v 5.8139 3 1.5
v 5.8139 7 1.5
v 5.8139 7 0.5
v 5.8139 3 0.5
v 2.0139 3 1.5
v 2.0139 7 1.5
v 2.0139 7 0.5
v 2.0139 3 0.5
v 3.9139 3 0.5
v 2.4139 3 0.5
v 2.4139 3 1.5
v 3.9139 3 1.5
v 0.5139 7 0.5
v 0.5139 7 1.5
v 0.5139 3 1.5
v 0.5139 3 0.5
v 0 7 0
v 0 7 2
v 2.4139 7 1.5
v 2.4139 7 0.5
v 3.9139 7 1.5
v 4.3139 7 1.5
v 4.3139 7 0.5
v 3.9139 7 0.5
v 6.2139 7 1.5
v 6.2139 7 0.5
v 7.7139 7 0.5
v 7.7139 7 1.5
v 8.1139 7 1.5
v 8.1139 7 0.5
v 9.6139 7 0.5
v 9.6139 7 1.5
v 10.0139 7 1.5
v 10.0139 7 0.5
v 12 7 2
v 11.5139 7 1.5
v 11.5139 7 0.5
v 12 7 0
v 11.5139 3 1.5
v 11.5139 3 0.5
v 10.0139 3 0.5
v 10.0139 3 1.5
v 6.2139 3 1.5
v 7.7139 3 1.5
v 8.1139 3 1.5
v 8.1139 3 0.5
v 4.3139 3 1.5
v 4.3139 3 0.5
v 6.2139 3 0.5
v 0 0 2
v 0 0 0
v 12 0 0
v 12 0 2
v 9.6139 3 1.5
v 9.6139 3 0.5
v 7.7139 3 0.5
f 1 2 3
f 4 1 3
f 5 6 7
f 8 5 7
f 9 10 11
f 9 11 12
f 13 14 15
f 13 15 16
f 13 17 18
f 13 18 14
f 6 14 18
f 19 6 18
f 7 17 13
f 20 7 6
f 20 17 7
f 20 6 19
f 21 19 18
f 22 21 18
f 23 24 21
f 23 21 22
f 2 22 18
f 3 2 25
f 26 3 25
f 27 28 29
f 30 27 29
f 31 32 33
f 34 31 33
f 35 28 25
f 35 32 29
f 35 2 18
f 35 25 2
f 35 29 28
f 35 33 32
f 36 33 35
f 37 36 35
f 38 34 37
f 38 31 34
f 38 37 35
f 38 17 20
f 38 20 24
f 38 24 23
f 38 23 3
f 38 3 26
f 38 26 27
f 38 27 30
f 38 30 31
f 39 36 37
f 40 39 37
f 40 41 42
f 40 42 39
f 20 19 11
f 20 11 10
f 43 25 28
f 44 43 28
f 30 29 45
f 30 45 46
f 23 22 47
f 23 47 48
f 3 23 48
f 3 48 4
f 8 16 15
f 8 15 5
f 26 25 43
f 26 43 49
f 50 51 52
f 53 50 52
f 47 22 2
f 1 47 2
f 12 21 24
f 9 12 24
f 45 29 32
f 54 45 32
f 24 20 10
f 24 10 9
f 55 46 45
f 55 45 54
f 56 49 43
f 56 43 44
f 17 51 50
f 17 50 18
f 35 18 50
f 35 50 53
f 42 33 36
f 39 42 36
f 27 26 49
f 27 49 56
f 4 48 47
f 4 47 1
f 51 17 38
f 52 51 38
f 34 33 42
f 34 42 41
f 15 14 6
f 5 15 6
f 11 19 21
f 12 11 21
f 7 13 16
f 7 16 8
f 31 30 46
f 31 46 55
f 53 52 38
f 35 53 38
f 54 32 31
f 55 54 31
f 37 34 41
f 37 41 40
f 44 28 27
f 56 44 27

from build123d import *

# Parameters (mm, degrees)
SKETCH1_W           = 12
SKETCH1_H           = 7
BOSS_EXTRUDE1_DEPTH = 2
SKETCH3_W           = 1.5
SKETCH3_H           = 1
CUT_EXTRUDE1_DEPTH  = 4
LPATTERN1_COUNT     = 6
LPATTERN1_PITCH     = 1.9


with BuildPart() as part:
    # Sketch1 → Boss-Extrude1 (new body)
    with BuildSketch(Plane.XY):
        with Locations((6, 3.5)):
            Rectangle(SKETCH1_W, SKETCH1_H)
    extrude(amount=BOSS_EXTRUDE1_DEPTH)

    # Sketch3 → Cut-Extrude1 (cut)
    with BuildSketch(Plane(origin=(0, 7, 0), x_dir=(1, 0, 0), z_dir=(0, 1, 0))):
        with Locations((1.263938608, -1)):
            Rectangle(SKETCH3_W, SKETCH3_H)
    cut_extrude1 = extrude(amount=-CUT_EXTRUDE1_DEPTH, mode=Mode.SUBTRACT)

    # LPattern1: Cut-Extrude1 ×6
    with Locations(*[(i * LPATTERN1_PITCH, 0, 0) for i in range(1, LPATTERN1_COUNT)]):
        add(cut_extrude1, mode=Mode.SUBTRACT)


solid = part.part
